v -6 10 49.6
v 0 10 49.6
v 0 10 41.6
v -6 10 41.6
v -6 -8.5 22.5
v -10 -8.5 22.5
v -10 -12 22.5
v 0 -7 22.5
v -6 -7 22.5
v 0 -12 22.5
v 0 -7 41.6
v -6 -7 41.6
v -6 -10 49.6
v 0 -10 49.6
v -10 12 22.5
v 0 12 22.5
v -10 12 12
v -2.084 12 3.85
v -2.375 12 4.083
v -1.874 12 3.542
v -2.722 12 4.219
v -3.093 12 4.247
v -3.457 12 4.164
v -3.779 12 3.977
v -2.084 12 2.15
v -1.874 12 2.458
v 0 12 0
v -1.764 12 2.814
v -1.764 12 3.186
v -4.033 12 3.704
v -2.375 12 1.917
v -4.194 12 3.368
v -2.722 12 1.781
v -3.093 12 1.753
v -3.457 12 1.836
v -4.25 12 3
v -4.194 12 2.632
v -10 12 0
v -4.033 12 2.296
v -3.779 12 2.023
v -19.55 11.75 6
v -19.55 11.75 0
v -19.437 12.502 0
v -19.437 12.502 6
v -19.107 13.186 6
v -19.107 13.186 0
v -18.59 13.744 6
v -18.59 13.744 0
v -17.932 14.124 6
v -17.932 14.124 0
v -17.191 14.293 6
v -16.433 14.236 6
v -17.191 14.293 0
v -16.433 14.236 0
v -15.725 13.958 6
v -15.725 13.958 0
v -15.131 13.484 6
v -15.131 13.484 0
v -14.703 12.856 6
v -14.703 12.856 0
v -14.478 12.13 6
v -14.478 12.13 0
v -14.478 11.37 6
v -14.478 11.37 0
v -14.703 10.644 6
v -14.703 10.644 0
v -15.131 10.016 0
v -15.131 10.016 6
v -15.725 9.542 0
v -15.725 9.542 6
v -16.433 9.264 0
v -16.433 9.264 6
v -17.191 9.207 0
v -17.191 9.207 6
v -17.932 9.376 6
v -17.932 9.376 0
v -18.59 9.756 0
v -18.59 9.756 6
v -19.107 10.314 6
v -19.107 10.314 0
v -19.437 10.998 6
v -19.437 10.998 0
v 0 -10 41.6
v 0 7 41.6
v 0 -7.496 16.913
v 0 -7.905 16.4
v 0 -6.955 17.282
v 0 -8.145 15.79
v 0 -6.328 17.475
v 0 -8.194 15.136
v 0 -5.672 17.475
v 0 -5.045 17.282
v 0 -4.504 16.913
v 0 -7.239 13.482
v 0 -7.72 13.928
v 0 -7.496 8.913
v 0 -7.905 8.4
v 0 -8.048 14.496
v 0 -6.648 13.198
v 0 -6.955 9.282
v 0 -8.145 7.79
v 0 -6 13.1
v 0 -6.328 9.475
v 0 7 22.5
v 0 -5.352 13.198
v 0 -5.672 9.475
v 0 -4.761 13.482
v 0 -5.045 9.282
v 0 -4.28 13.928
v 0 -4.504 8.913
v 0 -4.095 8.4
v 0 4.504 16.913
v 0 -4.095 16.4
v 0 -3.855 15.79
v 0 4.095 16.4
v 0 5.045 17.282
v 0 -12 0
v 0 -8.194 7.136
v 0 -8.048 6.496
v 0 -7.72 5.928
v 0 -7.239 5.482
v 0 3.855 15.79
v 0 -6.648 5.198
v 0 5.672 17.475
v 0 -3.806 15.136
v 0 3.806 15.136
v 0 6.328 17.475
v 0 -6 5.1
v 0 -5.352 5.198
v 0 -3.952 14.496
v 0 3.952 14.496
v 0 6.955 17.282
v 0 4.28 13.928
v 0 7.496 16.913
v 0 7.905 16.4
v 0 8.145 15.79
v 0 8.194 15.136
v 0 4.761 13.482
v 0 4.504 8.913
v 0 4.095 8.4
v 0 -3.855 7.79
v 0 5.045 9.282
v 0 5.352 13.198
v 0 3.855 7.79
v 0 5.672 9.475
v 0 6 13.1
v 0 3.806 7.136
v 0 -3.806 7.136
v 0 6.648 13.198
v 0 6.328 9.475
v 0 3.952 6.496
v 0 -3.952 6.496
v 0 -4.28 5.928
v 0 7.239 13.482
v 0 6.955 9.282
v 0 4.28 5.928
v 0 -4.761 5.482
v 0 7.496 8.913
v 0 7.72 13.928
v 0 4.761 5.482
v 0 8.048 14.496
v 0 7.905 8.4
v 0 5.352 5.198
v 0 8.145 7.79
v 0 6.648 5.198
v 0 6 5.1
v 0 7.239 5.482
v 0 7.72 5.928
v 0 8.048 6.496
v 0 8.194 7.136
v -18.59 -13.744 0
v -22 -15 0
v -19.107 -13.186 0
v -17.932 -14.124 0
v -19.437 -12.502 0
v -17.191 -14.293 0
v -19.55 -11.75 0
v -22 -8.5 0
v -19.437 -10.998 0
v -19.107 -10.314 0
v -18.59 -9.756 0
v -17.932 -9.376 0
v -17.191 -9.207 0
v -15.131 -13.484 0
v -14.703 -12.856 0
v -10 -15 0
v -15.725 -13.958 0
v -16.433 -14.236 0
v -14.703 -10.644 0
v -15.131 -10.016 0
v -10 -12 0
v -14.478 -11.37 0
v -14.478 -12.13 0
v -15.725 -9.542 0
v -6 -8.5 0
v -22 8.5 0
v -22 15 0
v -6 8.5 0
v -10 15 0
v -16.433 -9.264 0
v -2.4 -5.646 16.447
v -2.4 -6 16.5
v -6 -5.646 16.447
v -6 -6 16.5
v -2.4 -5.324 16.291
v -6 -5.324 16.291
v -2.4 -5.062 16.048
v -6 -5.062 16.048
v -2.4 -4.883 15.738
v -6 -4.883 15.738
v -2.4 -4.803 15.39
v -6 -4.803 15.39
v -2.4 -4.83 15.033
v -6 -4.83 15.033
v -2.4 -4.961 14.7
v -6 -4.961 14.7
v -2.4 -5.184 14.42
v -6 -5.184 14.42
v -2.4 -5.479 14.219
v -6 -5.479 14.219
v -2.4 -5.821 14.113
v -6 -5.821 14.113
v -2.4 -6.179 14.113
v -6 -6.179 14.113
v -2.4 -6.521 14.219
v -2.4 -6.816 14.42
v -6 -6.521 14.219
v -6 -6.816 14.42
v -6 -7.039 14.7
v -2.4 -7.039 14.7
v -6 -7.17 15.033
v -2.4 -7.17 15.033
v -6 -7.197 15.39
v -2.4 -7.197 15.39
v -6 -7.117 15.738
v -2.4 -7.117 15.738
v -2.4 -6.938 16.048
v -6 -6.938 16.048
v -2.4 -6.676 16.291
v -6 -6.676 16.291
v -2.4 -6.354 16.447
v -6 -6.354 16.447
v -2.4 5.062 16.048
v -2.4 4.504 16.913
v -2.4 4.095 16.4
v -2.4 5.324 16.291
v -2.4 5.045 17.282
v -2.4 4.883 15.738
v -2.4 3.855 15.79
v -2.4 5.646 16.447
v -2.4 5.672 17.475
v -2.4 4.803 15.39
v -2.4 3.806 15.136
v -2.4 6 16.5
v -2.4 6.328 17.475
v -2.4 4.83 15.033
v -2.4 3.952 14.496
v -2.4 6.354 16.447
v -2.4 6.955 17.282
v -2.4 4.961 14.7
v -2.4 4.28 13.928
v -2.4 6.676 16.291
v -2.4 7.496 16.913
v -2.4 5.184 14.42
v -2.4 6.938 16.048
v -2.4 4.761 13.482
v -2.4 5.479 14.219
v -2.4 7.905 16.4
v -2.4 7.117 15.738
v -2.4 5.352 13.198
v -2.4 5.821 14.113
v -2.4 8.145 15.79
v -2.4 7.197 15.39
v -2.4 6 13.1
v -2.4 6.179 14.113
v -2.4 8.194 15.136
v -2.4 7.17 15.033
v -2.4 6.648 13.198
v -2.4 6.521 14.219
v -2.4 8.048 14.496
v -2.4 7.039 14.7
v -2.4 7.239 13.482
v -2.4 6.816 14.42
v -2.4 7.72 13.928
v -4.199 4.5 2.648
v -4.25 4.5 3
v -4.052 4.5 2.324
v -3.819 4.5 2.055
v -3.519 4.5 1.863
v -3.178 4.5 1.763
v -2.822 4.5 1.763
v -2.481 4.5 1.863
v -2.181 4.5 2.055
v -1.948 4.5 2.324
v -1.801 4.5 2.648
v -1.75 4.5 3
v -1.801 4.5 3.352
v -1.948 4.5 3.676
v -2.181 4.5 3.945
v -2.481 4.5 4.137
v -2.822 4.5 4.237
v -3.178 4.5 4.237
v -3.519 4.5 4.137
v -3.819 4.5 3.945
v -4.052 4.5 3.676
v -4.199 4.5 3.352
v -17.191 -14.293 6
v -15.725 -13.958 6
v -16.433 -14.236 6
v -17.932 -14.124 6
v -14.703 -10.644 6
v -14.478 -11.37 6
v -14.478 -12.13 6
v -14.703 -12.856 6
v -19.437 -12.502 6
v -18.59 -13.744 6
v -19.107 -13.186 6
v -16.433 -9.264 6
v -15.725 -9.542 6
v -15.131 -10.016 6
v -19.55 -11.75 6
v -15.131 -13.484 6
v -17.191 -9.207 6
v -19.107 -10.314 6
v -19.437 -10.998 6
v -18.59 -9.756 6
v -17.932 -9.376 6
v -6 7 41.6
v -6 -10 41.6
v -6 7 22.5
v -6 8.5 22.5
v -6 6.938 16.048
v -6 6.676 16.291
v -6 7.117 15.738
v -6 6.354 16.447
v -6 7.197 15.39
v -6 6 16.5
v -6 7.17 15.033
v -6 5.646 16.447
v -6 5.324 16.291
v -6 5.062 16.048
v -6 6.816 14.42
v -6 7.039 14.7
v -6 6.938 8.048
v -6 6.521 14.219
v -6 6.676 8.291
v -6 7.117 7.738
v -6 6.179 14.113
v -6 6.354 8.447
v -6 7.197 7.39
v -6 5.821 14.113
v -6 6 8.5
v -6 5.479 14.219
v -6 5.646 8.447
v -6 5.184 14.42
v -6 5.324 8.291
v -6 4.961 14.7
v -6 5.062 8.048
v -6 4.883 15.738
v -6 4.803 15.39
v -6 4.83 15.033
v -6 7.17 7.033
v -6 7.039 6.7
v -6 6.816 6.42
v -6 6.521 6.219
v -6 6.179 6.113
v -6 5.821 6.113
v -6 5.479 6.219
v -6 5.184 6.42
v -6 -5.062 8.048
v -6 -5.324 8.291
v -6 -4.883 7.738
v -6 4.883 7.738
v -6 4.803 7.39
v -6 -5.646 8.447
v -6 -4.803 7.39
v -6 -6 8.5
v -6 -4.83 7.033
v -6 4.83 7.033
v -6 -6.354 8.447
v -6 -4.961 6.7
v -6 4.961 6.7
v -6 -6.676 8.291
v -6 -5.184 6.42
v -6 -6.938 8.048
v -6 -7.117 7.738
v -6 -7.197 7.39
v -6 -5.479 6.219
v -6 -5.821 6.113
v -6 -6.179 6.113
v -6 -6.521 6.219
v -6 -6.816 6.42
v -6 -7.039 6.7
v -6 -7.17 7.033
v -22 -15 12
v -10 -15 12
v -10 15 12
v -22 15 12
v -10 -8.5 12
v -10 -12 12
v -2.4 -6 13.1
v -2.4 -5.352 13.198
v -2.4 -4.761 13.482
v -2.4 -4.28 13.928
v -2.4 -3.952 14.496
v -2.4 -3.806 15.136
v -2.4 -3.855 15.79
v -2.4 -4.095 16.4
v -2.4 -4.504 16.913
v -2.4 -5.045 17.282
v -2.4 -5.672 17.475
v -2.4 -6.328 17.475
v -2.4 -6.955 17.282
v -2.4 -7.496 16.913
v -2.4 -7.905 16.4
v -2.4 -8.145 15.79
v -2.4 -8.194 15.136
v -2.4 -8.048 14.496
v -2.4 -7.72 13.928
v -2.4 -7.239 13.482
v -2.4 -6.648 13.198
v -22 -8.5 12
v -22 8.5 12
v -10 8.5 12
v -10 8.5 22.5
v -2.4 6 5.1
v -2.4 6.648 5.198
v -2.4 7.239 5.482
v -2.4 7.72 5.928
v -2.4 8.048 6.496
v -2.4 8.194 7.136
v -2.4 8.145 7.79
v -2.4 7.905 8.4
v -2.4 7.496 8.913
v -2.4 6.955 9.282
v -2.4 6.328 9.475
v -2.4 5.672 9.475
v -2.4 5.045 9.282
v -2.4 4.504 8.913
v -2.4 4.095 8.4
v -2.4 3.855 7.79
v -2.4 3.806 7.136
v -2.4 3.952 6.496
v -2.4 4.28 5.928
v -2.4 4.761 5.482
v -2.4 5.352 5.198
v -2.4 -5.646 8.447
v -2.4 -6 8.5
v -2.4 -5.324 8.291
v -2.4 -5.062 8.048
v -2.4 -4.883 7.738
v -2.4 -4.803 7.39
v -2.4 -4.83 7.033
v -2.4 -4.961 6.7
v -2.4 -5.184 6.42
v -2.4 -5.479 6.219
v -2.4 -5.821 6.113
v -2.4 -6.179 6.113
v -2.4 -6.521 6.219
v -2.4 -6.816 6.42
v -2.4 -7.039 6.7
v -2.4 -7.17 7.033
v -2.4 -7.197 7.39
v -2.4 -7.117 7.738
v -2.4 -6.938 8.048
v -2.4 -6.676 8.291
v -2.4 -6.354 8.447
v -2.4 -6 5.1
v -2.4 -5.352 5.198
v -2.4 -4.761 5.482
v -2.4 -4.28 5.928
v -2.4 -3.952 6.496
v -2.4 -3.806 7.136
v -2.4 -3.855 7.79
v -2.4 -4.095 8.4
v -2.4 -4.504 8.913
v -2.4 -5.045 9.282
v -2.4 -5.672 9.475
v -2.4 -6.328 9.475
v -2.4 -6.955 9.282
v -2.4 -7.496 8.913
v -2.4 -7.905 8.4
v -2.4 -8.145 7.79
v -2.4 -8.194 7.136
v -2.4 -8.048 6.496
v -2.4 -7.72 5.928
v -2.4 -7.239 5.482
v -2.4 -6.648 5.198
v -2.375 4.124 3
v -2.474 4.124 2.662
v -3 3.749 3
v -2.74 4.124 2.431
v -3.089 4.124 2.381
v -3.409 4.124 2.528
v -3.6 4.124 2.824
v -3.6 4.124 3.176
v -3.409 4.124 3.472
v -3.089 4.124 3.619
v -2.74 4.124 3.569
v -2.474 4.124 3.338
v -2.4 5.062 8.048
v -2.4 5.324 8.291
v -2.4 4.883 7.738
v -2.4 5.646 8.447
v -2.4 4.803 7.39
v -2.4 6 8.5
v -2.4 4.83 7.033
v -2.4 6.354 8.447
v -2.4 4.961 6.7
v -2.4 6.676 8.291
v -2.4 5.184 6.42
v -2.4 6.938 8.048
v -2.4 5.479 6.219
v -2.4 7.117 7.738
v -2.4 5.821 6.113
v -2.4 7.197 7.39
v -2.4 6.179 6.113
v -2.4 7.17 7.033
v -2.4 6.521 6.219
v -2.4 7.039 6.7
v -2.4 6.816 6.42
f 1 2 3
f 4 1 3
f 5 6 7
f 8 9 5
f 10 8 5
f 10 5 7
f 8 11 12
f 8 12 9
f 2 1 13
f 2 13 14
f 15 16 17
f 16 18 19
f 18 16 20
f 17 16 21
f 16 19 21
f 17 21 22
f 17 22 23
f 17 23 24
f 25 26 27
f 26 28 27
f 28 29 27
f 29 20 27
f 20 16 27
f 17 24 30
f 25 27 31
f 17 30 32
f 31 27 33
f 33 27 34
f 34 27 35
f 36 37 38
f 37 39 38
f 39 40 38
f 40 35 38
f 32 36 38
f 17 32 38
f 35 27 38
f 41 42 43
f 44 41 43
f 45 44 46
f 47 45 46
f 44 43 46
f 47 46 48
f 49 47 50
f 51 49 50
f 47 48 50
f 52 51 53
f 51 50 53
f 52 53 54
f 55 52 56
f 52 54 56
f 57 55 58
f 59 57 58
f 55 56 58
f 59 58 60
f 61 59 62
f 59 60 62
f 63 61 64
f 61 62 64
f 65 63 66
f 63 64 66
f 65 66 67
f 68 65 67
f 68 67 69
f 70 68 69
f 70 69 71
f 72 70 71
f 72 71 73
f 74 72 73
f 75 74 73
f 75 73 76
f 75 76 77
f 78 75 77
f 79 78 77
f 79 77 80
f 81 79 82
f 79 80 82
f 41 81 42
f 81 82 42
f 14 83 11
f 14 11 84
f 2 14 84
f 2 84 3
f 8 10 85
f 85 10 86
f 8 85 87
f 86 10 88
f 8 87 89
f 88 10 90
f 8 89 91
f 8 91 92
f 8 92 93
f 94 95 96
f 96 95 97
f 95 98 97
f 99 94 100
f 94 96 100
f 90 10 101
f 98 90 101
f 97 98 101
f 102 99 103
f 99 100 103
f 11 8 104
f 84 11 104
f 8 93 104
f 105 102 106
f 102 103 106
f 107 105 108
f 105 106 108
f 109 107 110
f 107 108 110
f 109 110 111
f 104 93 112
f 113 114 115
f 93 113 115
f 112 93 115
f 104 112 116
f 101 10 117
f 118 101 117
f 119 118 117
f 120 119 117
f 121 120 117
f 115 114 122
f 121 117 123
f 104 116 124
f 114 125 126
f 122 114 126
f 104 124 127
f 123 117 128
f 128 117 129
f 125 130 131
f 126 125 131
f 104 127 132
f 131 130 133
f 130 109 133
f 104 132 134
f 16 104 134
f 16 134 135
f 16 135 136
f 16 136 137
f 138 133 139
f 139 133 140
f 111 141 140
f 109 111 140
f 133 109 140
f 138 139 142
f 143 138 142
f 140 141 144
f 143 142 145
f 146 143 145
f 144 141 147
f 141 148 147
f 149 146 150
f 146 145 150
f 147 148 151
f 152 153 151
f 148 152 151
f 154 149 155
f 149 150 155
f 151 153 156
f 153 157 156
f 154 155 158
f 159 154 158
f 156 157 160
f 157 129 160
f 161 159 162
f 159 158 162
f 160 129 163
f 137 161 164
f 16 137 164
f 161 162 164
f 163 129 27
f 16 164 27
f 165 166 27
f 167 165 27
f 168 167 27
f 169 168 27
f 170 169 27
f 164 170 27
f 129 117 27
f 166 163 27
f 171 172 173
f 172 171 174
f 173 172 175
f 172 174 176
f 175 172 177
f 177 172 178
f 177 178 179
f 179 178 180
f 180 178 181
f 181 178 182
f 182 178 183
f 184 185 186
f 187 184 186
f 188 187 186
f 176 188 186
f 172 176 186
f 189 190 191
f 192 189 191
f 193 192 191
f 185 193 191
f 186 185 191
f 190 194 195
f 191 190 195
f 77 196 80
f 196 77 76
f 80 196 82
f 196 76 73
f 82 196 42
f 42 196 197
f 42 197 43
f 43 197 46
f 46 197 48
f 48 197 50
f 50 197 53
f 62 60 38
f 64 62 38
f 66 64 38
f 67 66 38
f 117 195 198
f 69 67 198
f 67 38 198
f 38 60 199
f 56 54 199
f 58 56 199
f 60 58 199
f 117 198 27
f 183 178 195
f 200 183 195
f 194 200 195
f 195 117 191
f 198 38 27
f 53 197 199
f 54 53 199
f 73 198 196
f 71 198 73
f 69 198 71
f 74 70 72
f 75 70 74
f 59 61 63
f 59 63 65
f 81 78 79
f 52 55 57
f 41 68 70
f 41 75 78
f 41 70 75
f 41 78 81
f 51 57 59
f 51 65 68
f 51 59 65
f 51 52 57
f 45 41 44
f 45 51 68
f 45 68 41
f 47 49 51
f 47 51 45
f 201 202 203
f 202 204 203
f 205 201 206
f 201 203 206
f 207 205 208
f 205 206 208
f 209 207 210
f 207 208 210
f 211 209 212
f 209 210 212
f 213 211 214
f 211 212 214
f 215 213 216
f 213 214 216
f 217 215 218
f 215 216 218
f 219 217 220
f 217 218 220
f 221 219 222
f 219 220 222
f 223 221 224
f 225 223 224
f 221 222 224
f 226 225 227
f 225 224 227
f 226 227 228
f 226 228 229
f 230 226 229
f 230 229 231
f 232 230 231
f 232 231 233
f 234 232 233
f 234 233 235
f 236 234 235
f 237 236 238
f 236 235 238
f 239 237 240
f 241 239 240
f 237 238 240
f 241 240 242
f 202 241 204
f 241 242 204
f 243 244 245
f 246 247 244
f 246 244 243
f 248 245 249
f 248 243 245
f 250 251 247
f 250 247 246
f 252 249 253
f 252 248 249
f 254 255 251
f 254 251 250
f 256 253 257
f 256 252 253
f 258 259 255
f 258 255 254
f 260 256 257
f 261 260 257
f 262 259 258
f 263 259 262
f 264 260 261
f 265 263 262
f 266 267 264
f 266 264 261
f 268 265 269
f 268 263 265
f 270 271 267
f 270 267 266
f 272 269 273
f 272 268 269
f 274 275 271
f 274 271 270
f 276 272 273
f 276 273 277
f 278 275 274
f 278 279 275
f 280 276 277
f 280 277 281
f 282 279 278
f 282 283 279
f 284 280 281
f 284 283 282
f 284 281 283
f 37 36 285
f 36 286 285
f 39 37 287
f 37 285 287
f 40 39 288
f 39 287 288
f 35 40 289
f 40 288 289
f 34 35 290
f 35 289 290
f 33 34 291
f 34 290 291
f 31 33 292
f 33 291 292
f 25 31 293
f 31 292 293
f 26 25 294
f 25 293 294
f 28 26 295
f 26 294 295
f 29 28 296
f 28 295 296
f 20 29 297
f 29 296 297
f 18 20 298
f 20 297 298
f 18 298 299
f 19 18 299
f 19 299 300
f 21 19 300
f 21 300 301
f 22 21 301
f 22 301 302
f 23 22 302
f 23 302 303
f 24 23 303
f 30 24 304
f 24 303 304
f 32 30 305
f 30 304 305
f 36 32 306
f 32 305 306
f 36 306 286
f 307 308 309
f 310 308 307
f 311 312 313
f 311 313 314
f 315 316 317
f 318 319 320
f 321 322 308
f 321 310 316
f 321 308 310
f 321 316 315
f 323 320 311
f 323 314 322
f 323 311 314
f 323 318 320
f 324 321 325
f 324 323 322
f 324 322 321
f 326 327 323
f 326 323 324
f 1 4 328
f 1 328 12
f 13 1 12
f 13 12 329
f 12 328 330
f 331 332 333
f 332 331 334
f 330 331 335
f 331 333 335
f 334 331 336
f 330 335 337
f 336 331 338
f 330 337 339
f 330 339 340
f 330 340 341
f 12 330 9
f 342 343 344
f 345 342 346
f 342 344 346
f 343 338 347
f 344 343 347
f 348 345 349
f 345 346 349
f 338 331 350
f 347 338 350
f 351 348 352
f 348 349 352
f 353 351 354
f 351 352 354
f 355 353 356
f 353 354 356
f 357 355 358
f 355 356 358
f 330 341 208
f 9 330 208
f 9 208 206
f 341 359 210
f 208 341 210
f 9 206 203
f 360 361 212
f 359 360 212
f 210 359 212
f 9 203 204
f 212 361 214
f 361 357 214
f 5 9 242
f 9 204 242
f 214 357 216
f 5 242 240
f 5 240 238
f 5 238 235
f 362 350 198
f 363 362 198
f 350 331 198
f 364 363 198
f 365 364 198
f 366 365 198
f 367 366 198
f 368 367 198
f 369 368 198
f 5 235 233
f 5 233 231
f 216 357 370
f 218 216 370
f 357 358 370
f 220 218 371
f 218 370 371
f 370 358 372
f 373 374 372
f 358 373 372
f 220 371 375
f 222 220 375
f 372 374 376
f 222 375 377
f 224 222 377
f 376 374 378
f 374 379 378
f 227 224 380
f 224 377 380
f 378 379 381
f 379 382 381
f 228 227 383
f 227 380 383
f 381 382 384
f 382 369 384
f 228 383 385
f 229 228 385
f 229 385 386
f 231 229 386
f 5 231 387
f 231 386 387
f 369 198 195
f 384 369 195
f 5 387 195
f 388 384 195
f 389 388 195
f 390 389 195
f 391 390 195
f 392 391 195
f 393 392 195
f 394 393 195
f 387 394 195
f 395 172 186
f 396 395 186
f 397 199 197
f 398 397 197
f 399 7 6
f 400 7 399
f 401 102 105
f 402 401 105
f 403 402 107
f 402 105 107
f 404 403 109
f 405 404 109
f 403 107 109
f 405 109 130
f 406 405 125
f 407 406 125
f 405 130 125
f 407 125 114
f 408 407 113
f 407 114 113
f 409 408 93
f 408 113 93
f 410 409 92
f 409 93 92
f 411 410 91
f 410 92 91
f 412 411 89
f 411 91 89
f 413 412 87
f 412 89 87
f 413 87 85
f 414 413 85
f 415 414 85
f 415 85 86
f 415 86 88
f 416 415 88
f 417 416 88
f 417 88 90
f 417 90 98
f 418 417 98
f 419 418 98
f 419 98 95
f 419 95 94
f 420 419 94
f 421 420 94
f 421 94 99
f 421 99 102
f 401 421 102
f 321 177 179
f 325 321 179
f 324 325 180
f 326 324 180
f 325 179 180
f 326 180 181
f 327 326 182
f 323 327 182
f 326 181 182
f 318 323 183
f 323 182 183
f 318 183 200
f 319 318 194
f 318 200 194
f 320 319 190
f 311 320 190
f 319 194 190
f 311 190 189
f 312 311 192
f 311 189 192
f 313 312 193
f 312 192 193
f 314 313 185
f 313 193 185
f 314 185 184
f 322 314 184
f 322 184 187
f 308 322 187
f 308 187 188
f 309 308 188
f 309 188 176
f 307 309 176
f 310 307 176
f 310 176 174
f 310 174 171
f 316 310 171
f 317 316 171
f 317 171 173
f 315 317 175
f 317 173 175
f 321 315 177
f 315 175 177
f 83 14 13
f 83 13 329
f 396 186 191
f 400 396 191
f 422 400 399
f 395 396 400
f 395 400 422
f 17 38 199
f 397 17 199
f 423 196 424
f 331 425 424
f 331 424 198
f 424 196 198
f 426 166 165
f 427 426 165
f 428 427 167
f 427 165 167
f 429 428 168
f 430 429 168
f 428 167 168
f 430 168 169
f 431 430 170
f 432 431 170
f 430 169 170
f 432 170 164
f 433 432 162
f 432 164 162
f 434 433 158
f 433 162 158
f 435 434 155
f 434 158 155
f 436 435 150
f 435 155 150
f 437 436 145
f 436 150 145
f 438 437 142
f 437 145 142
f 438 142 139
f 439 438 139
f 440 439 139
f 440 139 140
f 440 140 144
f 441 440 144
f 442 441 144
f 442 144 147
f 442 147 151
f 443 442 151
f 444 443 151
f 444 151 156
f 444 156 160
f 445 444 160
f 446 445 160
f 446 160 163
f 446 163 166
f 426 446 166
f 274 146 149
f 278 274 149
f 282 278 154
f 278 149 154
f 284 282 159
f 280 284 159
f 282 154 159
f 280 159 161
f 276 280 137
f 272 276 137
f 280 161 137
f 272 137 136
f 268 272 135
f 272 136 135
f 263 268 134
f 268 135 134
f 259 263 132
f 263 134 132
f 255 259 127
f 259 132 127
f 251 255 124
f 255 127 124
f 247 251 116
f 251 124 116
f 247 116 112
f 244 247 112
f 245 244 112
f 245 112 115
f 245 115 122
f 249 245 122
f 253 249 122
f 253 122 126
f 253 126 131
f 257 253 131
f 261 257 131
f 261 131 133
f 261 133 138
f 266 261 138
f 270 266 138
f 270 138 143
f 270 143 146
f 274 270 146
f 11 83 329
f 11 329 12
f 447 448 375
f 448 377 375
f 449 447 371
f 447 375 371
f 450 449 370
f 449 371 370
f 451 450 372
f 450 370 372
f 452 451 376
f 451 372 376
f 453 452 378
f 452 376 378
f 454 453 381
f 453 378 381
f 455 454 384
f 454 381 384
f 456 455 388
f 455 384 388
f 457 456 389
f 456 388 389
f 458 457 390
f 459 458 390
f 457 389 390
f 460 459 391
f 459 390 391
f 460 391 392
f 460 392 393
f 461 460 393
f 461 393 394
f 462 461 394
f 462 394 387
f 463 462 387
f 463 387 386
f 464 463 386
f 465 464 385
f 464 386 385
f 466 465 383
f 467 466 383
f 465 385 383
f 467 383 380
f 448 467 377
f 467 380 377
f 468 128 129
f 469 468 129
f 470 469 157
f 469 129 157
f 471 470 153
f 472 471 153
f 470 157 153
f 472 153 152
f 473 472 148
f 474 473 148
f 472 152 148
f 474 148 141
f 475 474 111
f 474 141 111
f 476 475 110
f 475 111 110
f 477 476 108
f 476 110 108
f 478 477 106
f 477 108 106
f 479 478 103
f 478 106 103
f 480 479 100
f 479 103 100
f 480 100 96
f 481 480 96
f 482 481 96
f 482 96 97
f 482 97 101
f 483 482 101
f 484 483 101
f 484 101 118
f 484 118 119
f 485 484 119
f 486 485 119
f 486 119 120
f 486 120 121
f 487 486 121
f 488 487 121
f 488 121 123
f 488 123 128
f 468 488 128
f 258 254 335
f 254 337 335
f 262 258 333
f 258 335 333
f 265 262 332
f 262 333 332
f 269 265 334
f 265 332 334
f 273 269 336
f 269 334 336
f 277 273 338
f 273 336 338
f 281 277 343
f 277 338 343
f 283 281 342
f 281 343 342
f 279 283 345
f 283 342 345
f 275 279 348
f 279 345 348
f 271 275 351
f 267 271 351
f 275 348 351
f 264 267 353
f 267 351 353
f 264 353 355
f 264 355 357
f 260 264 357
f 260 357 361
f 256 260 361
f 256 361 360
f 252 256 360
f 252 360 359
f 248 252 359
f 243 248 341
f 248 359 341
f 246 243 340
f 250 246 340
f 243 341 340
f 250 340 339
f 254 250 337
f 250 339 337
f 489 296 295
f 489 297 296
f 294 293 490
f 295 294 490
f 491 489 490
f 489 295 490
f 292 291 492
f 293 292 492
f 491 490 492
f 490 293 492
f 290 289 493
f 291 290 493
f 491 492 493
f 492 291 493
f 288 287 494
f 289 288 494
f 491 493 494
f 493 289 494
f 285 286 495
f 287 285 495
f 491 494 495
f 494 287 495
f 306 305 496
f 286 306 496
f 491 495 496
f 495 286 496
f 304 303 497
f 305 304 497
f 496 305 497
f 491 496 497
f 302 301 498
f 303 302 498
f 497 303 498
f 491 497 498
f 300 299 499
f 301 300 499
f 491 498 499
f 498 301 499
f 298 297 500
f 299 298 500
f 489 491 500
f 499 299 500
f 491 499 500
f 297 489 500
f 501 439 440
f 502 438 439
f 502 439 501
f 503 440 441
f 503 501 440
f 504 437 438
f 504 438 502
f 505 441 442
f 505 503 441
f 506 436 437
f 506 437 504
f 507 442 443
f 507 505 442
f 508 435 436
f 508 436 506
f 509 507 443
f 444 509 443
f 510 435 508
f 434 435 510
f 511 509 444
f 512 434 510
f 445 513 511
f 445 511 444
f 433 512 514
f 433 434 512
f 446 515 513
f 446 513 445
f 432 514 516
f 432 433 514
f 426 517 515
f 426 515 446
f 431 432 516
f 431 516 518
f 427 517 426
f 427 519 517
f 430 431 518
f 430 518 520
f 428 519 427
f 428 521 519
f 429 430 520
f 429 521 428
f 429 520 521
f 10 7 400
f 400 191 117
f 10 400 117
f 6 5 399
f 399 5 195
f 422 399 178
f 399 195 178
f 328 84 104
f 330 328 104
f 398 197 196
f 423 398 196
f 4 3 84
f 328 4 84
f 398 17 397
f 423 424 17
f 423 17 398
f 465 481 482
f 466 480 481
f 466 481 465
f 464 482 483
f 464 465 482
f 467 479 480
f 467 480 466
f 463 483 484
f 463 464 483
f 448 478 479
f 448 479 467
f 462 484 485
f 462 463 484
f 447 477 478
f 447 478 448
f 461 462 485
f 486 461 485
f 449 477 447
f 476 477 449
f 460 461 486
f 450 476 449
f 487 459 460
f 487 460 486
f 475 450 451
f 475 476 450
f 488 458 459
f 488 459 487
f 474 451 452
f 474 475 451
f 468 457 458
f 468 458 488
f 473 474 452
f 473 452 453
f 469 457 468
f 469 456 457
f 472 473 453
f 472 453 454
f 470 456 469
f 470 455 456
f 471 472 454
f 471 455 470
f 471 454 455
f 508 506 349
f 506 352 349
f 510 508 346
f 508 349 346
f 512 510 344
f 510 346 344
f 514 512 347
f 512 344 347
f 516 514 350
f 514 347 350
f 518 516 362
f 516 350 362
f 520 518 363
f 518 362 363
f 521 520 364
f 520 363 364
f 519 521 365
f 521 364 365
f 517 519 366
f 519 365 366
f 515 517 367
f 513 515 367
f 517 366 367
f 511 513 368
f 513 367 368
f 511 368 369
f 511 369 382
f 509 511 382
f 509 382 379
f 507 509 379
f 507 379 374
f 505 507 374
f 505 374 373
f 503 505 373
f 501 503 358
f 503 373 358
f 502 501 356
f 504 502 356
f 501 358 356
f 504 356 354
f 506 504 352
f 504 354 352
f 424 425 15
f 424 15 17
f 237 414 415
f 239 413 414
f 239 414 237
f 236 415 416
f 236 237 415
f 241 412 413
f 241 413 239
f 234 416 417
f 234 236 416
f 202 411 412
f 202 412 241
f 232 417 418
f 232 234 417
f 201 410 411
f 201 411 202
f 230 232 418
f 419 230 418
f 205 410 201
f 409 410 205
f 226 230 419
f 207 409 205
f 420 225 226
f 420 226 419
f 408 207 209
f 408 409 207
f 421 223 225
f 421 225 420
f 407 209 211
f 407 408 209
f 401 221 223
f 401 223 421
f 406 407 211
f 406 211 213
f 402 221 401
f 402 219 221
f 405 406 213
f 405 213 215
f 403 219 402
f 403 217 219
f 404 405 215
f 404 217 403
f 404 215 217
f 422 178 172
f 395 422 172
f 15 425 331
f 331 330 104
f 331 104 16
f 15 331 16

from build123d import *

# Parameters (mm, degrees)
EXTRUDE_1_DEPTH              = 49.6
CUT_EXTRUDE_1_DEPTH          = 31
CUT_EXTRUDE_2_DEPTH          = 49.6
HOLE_WIZARD_M2_1_D           = 2.4
HOLE_WIZARD_M2_1_DEPTH       = 10.1
HOLE_WIZARD_M2_1_CBORE_D     = 4.4
HOLE_WIZARD_M2_1_CBORE_DEPTH = 2.4
HOLE_WIZARD_M2_1_TIP         = 0.721032743
SKETCH_6_R                   = 2.55
CUT_EXTRUDE_3_DEPTH          = 6
HOLE_WIZARD_M3_1_D           = 2.5
HOLE_WIZARD_M3_1_DEPTH       = 7.5
HOLE_WIZARD_M3_1_TIP         = 0.751075774


with BuildPart() as part:
    # 草图1 → 凸台-拉伸1 (new body)
    with BuildSketch(Plane.XY):
        Polygon((-6, 8.5), (-6, -8.5), (-10, -8.5), (-22, -8.5), (-22, -15), (-10, -15), (-10, -12), (0, -12), (0, -10), (0, 10), (0, 12), (-10, 12), (-10, 15), (-22, 15), (-22, 8.5), (-10, 8.5), align=None)
    extrude(amount=EXTRUDE_1_DEPTH)

    # 草图2 → 切除-拉伸1 (cut, through all)
    with BuildSketch(Plane.XZ.offset(15)):
        Polygon((-22, 49.6), (-12.955077182, 49.6), (-6, 49.6), (-6, 22.5), (-10, 22.5), (-10, 12), (-22, 12), align=None)
    extrude(amount=-CUT_EXTRUDE_1_DEPTH, mode=Mode.SUBTRACT)

    # 草图3 → 切除-拉伸2 (cut)
    with BuildSketch(Plane(origin=(0, 0, 0), x_dir=(0, 0, -1), z_dir=(1, 0, 0))):
        Polygon((-22.5, 12), (-41.6, 12), (-49.6, 12), (-49.6, 10), (-41.6, 10), (-41.6, 7), (-22.5, 7), align=None)
        Polygon((-41.6, -12), (-49.6, -12), (-49.6, -10), (-41.6, -10), (-41.6, -7), (-22.5, -7), (-22.5, -12), align=None)
    extrude(amount=-CUT_EXTRUDE_2_DEPTH, mode=Mode.SUBTRACT)

    # M2 六角凹头螺钉的柱形沉头孔1
    with Locations(Plane(origin=(0, 0, 0), x_dir=(0, 0, -1), z_dir=(1, 0, 0))):
        with Locations((-15.3, 6), (-7.3, 6), (-15.3, -6), (-7.3, -6)):
            CounterBoreHole(HOLE_WIZARD_M2_1_D / 2, HOLE_WIZARD_M2_1_CBORE_D / 2, HOLE_WIZARD_M2_1_CBORE_DEPTH, depth=HOLE_WIZARD_M2_1_DEPTH)
            with Locations((0, 0, -(HOLE_WIZARD_M2_1_DEPTH + HOLE_WIZARD_M2_1_TIP / 2))):  # 118° drill point
                Cone(0, HOLE_WIZARD_M2_1_D / 2, HOLE_WIZARD_M2_1_TIP, mode=Mode.SUBTRACT)

    # 草图6 → 切除-拉伸3 (cut)
    with BuildSketch(Plane(origin=(0, 0, 0), x_dir=(-1, 0, 0), z_dir=(0, 0, -1))):
        with Locations((17, -11.75)):
            Circle(SKETCH_6_R)
        with Locations((17, 11.75)):
            Circle(SKETCH_6_R)
    extrude(amount=-CUT_EXTRUDE_3_DEPTH, mode=Mode.SUBTRACT)

    # M3 螺纹孔1
    with Locations(Plane(origin=(0, 12, 0), x_dir=(1, 0, 0), z_dir=(0, 1, 0))):
        with Locations((-3, -3)):
            Hole(HOLE_WIZARD_M3_1_D / 2, depth=HOLE_WIZARD_M3_1_DEPTH)
            with Locations((0, 0, -(HOLE_WIZARD_M3_1_DEPTH + HOLE_WIZARD_M3_1_TIP / 2))):  # 118° drill point
                Cone(0, HOLE_WIZARD_M3_1_D / 2, HOLE_WIZARD_M3_1_TIP, mode=Mode.SUBTRACT)


solid = part.part
